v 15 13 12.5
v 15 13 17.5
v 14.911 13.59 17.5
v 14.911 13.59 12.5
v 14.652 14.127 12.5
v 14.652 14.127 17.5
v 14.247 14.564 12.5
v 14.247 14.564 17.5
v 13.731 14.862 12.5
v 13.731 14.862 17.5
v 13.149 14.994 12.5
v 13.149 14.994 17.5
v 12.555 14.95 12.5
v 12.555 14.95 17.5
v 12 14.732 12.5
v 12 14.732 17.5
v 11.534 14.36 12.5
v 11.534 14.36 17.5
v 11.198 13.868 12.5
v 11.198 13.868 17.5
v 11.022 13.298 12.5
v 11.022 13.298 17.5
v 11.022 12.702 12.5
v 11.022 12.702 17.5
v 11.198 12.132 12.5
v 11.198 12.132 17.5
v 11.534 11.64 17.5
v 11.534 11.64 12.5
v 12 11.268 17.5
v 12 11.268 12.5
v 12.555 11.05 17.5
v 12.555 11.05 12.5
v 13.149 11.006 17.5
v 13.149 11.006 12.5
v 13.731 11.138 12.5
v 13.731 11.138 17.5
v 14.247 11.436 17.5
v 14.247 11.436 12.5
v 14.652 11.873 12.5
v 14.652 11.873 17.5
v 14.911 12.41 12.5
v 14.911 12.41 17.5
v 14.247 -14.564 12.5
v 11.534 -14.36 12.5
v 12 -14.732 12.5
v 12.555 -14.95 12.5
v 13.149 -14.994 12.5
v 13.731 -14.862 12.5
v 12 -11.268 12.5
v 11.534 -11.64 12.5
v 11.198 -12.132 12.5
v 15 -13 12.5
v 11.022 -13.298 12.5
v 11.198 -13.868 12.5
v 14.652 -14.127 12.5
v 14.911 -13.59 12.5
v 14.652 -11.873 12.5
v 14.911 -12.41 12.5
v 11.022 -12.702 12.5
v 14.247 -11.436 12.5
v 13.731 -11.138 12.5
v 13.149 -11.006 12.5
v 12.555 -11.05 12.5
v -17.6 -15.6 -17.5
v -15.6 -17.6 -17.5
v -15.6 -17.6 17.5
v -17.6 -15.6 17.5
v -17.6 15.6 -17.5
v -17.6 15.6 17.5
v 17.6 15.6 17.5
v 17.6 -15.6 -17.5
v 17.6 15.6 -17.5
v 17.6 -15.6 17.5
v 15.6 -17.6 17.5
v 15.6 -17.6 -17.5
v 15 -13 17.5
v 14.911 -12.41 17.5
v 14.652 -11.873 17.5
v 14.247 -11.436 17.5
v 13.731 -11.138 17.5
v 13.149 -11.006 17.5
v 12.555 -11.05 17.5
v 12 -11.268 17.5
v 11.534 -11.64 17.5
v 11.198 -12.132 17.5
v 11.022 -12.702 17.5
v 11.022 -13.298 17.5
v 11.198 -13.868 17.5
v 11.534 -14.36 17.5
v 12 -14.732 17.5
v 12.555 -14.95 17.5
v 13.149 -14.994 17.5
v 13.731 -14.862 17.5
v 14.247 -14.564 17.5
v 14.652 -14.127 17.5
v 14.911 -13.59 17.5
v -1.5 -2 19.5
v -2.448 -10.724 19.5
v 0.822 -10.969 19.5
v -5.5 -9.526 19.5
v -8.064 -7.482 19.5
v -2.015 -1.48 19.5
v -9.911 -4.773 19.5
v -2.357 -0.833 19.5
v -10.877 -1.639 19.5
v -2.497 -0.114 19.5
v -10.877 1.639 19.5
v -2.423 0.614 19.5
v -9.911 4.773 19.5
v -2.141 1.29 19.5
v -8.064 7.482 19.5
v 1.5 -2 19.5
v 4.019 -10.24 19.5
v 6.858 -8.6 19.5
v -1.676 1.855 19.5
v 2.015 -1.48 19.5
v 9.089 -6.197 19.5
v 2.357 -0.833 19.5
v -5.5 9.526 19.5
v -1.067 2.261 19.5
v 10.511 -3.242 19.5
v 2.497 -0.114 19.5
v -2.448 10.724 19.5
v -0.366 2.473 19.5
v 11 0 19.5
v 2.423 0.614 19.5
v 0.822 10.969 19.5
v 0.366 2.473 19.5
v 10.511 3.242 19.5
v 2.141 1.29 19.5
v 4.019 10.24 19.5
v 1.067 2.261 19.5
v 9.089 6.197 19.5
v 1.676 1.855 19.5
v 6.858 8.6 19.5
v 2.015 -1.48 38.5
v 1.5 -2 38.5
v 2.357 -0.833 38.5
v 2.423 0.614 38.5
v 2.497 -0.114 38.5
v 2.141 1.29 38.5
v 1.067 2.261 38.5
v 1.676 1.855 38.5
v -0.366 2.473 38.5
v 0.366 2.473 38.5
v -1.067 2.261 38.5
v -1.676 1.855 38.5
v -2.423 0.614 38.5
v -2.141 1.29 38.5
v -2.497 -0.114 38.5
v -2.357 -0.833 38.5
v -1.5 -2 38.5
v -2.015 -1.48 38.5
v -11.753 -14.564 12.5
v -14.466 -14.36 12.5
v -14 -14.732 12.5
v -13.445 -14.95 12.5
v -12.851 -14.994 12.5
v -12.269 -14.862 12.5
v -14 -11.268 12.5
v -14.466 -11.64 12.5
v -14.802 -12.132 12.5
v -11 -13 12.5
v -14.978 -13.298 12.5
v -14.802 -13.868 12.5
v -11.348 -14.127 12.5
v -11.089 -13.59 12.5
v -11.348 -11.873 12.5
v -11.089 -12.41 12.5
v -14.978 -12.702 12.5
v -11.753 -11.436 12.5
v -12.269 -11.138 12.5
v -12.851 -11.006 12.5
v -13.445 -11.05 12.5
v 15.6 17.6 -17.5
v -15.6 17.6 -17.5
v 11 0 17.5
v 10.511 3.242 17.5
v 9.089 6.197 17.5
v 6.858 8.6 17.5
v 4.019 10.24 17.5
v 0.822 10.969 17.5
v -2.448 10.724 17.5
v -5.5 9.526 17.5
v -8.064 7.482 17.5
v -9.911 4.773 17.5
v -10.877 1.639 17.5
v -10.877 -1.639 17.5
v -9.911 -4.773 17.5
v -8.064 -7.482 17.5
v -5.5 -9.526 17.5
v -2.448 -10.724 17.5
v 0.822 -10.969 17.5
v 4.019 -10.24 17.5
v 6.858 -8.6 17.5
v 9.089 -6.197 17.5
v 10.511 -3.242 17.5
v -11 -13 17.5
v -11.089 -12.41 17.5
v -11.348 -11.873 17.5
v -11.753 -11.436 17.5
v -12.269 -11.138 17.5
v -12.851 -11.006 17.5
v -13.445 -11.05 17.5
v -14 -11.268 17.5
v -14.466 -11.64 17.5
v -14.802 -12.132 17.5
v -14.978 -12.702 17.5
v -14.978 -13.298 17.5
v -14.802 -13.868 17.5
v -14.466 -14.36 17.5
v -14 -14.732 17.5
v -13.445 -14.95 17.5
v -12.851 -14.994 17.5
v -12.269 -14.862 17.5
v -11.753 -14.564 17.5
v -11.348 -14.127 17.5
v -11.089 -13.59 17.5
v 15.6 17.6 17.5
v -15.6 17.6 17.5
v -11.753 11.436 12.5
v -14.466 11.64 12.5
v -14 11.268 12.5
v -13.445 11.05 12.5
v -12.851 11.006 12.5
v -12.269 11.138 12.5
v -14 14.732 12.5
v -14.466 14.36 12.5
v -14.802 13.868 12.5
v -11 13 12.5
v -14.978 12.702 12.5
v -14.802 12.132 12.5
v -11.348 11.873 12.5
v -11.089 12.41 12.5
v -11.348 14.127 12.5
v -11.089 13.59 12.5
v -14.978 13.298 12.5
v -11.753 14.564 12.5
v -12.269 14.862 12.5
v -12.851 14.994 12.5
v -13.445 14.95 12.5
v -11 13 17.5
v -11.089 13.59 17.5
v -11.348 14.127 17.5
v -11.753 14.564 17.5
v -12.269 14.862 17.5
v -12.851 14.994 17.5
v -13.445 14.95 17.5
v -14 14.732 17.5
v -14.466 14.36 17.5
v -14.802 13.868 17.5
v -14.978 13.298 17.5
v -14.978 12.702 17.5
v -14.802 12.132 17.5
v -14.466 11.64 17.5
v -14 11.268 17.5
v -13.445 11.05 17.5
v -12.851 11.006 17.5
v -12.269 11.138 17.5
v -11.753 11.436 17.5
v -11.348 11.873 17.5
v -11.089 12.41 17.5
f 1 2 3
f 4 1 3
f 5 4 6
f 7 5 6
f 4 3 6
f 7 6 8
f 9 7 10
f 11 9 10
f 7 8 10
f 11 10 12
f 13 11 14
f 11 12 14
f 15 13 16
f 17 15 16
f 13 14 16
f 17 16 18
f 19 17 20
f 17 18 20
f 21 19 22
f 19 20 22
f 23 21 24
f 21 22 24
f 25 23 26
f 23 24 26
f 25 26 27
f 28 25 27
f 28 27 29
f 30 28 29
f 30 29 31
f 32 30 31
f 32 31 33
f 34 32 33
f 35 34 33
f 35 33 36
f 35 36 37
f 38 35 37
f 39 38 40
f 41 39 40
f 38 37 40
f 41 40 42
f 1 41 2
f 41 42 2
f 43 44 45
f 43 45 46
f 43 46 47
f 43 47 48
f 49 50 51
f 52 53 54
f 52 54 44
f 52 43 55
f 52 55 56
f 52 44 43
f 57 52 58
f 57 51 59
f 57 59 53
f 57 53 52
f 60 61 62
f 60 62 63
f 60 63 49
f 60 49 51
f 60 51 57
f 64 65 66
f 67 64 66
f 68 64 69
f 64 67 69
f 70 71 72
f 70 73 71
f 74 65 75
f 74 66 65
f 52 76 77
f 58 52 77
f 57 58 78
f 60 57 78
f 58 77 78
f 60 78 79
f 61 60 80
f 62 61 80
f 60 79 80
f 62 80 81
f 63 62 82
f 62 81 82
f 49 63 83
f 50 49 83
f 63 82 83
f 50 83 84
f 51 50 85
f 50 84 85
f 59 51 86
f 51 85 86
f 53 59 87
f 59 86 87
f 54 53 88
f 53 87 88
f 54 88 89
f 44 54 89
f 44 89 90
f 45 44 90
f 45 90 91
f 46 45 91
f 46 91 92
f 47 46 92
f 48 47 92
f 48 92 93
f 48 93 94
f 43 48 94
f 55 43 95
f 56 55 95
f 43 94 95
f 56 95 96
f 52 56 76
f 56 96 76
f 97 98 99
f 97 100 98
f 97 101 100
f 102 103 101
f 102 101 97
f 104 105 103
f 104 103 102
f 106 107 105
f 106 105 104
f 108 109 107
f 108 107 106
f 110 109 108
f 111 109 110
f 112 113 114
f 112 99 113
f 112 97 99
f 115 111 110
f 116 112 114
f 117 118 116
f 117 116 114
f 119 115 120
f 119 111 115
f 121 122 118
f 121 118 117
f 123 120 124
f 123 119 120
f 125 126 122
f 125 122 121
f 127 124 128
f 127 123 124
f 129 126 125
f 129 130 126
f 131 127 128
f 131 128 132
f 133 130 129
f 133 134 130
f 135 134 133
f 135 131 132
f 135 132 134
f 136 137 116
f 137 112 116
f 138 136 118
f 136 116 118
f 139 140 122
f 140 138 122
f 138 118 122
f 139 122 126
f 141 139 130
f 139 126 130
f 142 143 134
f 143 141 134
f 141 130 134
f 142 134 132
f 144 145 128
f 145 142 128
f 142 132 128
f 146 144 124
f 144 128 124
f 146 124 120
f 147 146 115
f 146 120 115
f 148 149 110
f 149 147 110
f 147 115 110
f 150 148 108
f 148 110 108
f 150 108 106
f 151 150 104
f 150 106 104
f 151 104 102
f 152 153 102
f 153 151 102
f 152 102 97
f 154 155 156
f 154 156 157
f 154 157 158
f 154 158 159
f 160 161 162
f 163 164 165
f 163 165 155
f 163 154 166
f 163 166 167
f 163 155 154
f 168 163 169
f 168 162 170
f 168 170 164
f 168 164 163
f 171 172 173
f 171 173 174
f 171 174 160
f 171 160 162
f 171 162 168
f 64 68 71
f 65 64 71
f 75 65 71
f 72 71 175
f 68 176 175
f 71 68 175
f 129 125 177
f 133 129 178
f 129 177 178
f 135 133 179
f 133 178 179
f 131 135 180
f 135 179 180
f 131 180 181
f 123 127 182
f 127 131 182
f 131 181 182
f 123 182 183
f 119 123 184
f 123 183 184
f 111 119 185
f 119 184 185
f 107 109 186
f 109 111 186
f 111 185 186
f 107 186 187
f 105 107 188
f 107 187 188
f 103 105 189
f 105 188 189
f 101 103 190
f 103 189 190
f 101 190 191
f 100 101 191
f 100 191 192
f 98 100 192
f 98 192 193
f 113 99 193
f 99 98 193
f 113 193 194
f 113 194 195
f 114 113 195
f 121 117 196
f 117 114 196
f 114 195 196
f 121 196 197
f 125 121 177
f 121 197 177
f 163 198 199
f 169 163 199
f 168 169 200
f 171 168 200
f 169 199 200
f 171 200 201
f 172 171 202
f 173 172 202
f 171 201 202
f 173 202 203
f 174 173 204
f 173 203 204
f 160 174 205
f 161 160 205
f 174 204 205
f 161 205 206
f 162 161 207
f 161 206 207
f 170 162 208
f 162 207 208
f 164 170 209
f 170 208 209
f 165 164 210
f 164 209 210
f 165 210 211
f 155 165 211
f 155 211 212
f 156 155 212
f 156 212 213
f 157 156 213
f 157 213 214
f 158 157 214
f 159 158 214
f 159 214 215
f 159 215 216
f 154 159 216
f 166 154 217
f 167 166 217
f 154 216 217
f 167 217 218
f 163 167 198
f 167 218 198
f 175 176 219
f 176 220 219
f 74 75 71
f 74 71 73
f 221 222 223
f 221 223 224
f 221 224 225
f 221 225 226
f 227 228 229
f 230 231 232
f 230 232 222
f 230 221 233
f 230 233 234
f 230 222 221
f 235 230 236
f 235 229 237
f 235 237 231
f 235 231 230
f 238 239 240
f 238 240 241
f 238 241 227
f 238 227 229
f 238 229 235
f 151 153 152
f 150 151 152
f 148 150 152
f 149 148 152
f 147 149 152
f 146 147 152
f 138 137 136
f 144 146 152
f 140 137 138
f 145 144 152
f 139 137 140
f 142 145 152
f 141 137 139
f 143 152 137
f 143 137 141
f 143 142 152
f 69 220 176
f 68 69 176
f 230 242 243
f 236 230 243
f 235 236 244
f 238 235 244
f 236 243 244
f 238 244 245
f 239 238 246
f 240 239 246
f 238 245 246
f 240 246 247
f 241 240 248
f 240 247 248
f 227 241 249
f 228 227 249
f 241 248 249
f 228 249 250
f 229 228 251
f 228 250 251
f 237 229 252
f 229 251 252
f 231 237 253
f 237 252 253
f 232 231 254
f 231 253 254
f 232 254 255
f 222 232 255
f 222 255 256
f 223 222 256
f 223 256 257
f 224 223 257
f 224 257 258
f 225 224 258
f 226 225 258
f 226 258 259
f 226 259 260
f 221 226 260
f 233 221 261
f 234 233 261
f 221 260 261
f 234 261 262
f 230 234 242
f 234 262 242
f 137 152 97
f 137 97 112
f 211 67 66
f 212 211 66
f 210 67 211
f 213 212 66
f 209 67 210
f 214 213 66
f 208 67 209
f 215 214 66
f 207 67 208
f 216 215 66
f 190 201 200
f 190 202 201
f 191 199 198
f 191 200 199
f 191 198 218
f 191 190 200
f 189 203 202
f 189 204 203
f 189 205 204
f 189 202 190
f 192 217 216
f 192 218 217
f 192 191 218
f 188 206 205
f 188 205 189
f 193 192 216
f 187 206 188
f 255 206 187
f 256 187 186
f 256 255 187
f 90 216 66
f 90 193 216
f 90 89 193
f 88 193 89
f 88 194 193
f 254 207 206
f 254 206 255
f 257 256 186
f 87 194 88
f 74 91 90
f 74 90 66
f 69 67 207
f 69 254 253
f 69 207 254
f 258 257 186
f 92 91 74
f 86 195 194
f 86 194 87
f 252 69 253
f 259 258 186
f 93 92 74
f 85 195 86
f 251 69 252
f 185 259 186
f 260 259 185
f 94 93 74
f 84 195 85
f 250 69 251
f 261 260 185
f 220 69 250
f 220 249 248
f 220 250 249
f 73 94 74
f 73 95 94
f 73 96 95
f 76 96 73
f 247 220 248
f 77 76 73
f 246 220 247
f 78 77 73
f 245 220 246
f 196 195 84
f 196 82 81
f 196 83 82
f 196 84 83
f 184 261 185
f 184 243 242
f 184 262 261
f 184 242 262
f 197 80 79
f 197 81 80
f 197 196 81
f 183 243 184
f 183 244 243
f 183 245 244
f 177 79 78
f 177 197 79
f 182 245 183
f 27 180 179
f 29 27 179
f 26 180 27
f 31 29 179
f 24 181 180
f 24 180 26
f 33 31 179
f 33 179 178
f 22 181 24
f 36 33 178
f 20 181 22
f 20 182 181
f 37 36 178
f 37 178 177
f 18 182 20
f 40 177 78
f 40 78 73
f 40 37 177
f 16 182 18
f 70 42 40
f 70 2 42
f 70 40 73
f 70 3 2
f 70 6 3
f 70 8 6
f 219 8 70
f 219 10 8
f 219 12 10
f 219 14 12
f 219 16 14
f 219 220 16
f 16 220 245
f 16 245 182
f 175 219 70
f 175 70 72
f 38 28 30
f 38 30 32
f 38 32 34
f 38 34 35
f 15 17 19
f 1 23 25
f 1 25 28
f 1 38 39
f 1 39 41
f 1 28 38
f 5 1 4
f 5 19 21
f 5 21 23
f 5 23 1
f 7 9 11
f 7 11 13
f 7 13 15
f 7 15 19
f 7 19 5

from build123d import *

# Parameters (mm, degrees)
F0_W      = 35.2
F0_H      = 35.2
F1_DEPTH  = 17.5
F2_SIZE   = 2
F3_R      = 11
F4_DEPTH  = 2
F5_R      = 2
F6_DEPTH  = 5
F7_R      = 2.5
F8_DEPTH  = 19
F10_W     = 5
F10_H     = 19
F11_DEPTH = 15.601


with BuildPart() as f1:
    # F0 (on Top) → F1 (new body, symmetric)
    with BuildSketch(Plane.XY):
        Rectangle(F0_W, F0_H)
    extrude(amount=F1_DEPTH, both=True)

    # F2
    f2_edges = [f1.edges().sort_by_distance(p)[0] for p in [
        (-17.6, 17.6, 0),
        (-17.6, -17.6, 0),
        (17.6, -17.6, 0),
        (17.6, 17.6, 0),
    ]]
    chamfer(f2_edges, length=F2_SIZE)

    # F3 (on face) → F4 (join)
    with BuildSketch(Plane.XY.offset(17.5)):
        Circle(F3_R)
    extrude(amount=F4_DEPTH)

    # F5 (on face) → F6 (cut)
    with BuildSketch(Plane.XY.offset(17.5)):
        with Locations((-13, 13)):
            Circle(F5_R)
        with Locations((13, 13)):
            Circle(F5_R)
        with Locations((-13, -13)):
            Circle(F5_R)
        with Locations((13, -13)):
            Circle(F5_R)
    extrude(amount=-F6_DEPTH, mode=Mode.SUBTRACT)

    # F7 (on face) → F8 (join)
    with BuildSketch(Plane.XY.offset(19.5)):
        Circle(F7_R)
    extrude(amount=F8_DEPTH)

    # F10 (on offset) → F11 (cut, through all)
    with BuildSketch(Plane.XZ.offset(2)):
        with Locations((0, 29)):
            Rectangle(F10_W, F10_H)
    extrude(amount=F11_DEPTH, mode=Mode.SUBTRACT)


solid = f1.part
